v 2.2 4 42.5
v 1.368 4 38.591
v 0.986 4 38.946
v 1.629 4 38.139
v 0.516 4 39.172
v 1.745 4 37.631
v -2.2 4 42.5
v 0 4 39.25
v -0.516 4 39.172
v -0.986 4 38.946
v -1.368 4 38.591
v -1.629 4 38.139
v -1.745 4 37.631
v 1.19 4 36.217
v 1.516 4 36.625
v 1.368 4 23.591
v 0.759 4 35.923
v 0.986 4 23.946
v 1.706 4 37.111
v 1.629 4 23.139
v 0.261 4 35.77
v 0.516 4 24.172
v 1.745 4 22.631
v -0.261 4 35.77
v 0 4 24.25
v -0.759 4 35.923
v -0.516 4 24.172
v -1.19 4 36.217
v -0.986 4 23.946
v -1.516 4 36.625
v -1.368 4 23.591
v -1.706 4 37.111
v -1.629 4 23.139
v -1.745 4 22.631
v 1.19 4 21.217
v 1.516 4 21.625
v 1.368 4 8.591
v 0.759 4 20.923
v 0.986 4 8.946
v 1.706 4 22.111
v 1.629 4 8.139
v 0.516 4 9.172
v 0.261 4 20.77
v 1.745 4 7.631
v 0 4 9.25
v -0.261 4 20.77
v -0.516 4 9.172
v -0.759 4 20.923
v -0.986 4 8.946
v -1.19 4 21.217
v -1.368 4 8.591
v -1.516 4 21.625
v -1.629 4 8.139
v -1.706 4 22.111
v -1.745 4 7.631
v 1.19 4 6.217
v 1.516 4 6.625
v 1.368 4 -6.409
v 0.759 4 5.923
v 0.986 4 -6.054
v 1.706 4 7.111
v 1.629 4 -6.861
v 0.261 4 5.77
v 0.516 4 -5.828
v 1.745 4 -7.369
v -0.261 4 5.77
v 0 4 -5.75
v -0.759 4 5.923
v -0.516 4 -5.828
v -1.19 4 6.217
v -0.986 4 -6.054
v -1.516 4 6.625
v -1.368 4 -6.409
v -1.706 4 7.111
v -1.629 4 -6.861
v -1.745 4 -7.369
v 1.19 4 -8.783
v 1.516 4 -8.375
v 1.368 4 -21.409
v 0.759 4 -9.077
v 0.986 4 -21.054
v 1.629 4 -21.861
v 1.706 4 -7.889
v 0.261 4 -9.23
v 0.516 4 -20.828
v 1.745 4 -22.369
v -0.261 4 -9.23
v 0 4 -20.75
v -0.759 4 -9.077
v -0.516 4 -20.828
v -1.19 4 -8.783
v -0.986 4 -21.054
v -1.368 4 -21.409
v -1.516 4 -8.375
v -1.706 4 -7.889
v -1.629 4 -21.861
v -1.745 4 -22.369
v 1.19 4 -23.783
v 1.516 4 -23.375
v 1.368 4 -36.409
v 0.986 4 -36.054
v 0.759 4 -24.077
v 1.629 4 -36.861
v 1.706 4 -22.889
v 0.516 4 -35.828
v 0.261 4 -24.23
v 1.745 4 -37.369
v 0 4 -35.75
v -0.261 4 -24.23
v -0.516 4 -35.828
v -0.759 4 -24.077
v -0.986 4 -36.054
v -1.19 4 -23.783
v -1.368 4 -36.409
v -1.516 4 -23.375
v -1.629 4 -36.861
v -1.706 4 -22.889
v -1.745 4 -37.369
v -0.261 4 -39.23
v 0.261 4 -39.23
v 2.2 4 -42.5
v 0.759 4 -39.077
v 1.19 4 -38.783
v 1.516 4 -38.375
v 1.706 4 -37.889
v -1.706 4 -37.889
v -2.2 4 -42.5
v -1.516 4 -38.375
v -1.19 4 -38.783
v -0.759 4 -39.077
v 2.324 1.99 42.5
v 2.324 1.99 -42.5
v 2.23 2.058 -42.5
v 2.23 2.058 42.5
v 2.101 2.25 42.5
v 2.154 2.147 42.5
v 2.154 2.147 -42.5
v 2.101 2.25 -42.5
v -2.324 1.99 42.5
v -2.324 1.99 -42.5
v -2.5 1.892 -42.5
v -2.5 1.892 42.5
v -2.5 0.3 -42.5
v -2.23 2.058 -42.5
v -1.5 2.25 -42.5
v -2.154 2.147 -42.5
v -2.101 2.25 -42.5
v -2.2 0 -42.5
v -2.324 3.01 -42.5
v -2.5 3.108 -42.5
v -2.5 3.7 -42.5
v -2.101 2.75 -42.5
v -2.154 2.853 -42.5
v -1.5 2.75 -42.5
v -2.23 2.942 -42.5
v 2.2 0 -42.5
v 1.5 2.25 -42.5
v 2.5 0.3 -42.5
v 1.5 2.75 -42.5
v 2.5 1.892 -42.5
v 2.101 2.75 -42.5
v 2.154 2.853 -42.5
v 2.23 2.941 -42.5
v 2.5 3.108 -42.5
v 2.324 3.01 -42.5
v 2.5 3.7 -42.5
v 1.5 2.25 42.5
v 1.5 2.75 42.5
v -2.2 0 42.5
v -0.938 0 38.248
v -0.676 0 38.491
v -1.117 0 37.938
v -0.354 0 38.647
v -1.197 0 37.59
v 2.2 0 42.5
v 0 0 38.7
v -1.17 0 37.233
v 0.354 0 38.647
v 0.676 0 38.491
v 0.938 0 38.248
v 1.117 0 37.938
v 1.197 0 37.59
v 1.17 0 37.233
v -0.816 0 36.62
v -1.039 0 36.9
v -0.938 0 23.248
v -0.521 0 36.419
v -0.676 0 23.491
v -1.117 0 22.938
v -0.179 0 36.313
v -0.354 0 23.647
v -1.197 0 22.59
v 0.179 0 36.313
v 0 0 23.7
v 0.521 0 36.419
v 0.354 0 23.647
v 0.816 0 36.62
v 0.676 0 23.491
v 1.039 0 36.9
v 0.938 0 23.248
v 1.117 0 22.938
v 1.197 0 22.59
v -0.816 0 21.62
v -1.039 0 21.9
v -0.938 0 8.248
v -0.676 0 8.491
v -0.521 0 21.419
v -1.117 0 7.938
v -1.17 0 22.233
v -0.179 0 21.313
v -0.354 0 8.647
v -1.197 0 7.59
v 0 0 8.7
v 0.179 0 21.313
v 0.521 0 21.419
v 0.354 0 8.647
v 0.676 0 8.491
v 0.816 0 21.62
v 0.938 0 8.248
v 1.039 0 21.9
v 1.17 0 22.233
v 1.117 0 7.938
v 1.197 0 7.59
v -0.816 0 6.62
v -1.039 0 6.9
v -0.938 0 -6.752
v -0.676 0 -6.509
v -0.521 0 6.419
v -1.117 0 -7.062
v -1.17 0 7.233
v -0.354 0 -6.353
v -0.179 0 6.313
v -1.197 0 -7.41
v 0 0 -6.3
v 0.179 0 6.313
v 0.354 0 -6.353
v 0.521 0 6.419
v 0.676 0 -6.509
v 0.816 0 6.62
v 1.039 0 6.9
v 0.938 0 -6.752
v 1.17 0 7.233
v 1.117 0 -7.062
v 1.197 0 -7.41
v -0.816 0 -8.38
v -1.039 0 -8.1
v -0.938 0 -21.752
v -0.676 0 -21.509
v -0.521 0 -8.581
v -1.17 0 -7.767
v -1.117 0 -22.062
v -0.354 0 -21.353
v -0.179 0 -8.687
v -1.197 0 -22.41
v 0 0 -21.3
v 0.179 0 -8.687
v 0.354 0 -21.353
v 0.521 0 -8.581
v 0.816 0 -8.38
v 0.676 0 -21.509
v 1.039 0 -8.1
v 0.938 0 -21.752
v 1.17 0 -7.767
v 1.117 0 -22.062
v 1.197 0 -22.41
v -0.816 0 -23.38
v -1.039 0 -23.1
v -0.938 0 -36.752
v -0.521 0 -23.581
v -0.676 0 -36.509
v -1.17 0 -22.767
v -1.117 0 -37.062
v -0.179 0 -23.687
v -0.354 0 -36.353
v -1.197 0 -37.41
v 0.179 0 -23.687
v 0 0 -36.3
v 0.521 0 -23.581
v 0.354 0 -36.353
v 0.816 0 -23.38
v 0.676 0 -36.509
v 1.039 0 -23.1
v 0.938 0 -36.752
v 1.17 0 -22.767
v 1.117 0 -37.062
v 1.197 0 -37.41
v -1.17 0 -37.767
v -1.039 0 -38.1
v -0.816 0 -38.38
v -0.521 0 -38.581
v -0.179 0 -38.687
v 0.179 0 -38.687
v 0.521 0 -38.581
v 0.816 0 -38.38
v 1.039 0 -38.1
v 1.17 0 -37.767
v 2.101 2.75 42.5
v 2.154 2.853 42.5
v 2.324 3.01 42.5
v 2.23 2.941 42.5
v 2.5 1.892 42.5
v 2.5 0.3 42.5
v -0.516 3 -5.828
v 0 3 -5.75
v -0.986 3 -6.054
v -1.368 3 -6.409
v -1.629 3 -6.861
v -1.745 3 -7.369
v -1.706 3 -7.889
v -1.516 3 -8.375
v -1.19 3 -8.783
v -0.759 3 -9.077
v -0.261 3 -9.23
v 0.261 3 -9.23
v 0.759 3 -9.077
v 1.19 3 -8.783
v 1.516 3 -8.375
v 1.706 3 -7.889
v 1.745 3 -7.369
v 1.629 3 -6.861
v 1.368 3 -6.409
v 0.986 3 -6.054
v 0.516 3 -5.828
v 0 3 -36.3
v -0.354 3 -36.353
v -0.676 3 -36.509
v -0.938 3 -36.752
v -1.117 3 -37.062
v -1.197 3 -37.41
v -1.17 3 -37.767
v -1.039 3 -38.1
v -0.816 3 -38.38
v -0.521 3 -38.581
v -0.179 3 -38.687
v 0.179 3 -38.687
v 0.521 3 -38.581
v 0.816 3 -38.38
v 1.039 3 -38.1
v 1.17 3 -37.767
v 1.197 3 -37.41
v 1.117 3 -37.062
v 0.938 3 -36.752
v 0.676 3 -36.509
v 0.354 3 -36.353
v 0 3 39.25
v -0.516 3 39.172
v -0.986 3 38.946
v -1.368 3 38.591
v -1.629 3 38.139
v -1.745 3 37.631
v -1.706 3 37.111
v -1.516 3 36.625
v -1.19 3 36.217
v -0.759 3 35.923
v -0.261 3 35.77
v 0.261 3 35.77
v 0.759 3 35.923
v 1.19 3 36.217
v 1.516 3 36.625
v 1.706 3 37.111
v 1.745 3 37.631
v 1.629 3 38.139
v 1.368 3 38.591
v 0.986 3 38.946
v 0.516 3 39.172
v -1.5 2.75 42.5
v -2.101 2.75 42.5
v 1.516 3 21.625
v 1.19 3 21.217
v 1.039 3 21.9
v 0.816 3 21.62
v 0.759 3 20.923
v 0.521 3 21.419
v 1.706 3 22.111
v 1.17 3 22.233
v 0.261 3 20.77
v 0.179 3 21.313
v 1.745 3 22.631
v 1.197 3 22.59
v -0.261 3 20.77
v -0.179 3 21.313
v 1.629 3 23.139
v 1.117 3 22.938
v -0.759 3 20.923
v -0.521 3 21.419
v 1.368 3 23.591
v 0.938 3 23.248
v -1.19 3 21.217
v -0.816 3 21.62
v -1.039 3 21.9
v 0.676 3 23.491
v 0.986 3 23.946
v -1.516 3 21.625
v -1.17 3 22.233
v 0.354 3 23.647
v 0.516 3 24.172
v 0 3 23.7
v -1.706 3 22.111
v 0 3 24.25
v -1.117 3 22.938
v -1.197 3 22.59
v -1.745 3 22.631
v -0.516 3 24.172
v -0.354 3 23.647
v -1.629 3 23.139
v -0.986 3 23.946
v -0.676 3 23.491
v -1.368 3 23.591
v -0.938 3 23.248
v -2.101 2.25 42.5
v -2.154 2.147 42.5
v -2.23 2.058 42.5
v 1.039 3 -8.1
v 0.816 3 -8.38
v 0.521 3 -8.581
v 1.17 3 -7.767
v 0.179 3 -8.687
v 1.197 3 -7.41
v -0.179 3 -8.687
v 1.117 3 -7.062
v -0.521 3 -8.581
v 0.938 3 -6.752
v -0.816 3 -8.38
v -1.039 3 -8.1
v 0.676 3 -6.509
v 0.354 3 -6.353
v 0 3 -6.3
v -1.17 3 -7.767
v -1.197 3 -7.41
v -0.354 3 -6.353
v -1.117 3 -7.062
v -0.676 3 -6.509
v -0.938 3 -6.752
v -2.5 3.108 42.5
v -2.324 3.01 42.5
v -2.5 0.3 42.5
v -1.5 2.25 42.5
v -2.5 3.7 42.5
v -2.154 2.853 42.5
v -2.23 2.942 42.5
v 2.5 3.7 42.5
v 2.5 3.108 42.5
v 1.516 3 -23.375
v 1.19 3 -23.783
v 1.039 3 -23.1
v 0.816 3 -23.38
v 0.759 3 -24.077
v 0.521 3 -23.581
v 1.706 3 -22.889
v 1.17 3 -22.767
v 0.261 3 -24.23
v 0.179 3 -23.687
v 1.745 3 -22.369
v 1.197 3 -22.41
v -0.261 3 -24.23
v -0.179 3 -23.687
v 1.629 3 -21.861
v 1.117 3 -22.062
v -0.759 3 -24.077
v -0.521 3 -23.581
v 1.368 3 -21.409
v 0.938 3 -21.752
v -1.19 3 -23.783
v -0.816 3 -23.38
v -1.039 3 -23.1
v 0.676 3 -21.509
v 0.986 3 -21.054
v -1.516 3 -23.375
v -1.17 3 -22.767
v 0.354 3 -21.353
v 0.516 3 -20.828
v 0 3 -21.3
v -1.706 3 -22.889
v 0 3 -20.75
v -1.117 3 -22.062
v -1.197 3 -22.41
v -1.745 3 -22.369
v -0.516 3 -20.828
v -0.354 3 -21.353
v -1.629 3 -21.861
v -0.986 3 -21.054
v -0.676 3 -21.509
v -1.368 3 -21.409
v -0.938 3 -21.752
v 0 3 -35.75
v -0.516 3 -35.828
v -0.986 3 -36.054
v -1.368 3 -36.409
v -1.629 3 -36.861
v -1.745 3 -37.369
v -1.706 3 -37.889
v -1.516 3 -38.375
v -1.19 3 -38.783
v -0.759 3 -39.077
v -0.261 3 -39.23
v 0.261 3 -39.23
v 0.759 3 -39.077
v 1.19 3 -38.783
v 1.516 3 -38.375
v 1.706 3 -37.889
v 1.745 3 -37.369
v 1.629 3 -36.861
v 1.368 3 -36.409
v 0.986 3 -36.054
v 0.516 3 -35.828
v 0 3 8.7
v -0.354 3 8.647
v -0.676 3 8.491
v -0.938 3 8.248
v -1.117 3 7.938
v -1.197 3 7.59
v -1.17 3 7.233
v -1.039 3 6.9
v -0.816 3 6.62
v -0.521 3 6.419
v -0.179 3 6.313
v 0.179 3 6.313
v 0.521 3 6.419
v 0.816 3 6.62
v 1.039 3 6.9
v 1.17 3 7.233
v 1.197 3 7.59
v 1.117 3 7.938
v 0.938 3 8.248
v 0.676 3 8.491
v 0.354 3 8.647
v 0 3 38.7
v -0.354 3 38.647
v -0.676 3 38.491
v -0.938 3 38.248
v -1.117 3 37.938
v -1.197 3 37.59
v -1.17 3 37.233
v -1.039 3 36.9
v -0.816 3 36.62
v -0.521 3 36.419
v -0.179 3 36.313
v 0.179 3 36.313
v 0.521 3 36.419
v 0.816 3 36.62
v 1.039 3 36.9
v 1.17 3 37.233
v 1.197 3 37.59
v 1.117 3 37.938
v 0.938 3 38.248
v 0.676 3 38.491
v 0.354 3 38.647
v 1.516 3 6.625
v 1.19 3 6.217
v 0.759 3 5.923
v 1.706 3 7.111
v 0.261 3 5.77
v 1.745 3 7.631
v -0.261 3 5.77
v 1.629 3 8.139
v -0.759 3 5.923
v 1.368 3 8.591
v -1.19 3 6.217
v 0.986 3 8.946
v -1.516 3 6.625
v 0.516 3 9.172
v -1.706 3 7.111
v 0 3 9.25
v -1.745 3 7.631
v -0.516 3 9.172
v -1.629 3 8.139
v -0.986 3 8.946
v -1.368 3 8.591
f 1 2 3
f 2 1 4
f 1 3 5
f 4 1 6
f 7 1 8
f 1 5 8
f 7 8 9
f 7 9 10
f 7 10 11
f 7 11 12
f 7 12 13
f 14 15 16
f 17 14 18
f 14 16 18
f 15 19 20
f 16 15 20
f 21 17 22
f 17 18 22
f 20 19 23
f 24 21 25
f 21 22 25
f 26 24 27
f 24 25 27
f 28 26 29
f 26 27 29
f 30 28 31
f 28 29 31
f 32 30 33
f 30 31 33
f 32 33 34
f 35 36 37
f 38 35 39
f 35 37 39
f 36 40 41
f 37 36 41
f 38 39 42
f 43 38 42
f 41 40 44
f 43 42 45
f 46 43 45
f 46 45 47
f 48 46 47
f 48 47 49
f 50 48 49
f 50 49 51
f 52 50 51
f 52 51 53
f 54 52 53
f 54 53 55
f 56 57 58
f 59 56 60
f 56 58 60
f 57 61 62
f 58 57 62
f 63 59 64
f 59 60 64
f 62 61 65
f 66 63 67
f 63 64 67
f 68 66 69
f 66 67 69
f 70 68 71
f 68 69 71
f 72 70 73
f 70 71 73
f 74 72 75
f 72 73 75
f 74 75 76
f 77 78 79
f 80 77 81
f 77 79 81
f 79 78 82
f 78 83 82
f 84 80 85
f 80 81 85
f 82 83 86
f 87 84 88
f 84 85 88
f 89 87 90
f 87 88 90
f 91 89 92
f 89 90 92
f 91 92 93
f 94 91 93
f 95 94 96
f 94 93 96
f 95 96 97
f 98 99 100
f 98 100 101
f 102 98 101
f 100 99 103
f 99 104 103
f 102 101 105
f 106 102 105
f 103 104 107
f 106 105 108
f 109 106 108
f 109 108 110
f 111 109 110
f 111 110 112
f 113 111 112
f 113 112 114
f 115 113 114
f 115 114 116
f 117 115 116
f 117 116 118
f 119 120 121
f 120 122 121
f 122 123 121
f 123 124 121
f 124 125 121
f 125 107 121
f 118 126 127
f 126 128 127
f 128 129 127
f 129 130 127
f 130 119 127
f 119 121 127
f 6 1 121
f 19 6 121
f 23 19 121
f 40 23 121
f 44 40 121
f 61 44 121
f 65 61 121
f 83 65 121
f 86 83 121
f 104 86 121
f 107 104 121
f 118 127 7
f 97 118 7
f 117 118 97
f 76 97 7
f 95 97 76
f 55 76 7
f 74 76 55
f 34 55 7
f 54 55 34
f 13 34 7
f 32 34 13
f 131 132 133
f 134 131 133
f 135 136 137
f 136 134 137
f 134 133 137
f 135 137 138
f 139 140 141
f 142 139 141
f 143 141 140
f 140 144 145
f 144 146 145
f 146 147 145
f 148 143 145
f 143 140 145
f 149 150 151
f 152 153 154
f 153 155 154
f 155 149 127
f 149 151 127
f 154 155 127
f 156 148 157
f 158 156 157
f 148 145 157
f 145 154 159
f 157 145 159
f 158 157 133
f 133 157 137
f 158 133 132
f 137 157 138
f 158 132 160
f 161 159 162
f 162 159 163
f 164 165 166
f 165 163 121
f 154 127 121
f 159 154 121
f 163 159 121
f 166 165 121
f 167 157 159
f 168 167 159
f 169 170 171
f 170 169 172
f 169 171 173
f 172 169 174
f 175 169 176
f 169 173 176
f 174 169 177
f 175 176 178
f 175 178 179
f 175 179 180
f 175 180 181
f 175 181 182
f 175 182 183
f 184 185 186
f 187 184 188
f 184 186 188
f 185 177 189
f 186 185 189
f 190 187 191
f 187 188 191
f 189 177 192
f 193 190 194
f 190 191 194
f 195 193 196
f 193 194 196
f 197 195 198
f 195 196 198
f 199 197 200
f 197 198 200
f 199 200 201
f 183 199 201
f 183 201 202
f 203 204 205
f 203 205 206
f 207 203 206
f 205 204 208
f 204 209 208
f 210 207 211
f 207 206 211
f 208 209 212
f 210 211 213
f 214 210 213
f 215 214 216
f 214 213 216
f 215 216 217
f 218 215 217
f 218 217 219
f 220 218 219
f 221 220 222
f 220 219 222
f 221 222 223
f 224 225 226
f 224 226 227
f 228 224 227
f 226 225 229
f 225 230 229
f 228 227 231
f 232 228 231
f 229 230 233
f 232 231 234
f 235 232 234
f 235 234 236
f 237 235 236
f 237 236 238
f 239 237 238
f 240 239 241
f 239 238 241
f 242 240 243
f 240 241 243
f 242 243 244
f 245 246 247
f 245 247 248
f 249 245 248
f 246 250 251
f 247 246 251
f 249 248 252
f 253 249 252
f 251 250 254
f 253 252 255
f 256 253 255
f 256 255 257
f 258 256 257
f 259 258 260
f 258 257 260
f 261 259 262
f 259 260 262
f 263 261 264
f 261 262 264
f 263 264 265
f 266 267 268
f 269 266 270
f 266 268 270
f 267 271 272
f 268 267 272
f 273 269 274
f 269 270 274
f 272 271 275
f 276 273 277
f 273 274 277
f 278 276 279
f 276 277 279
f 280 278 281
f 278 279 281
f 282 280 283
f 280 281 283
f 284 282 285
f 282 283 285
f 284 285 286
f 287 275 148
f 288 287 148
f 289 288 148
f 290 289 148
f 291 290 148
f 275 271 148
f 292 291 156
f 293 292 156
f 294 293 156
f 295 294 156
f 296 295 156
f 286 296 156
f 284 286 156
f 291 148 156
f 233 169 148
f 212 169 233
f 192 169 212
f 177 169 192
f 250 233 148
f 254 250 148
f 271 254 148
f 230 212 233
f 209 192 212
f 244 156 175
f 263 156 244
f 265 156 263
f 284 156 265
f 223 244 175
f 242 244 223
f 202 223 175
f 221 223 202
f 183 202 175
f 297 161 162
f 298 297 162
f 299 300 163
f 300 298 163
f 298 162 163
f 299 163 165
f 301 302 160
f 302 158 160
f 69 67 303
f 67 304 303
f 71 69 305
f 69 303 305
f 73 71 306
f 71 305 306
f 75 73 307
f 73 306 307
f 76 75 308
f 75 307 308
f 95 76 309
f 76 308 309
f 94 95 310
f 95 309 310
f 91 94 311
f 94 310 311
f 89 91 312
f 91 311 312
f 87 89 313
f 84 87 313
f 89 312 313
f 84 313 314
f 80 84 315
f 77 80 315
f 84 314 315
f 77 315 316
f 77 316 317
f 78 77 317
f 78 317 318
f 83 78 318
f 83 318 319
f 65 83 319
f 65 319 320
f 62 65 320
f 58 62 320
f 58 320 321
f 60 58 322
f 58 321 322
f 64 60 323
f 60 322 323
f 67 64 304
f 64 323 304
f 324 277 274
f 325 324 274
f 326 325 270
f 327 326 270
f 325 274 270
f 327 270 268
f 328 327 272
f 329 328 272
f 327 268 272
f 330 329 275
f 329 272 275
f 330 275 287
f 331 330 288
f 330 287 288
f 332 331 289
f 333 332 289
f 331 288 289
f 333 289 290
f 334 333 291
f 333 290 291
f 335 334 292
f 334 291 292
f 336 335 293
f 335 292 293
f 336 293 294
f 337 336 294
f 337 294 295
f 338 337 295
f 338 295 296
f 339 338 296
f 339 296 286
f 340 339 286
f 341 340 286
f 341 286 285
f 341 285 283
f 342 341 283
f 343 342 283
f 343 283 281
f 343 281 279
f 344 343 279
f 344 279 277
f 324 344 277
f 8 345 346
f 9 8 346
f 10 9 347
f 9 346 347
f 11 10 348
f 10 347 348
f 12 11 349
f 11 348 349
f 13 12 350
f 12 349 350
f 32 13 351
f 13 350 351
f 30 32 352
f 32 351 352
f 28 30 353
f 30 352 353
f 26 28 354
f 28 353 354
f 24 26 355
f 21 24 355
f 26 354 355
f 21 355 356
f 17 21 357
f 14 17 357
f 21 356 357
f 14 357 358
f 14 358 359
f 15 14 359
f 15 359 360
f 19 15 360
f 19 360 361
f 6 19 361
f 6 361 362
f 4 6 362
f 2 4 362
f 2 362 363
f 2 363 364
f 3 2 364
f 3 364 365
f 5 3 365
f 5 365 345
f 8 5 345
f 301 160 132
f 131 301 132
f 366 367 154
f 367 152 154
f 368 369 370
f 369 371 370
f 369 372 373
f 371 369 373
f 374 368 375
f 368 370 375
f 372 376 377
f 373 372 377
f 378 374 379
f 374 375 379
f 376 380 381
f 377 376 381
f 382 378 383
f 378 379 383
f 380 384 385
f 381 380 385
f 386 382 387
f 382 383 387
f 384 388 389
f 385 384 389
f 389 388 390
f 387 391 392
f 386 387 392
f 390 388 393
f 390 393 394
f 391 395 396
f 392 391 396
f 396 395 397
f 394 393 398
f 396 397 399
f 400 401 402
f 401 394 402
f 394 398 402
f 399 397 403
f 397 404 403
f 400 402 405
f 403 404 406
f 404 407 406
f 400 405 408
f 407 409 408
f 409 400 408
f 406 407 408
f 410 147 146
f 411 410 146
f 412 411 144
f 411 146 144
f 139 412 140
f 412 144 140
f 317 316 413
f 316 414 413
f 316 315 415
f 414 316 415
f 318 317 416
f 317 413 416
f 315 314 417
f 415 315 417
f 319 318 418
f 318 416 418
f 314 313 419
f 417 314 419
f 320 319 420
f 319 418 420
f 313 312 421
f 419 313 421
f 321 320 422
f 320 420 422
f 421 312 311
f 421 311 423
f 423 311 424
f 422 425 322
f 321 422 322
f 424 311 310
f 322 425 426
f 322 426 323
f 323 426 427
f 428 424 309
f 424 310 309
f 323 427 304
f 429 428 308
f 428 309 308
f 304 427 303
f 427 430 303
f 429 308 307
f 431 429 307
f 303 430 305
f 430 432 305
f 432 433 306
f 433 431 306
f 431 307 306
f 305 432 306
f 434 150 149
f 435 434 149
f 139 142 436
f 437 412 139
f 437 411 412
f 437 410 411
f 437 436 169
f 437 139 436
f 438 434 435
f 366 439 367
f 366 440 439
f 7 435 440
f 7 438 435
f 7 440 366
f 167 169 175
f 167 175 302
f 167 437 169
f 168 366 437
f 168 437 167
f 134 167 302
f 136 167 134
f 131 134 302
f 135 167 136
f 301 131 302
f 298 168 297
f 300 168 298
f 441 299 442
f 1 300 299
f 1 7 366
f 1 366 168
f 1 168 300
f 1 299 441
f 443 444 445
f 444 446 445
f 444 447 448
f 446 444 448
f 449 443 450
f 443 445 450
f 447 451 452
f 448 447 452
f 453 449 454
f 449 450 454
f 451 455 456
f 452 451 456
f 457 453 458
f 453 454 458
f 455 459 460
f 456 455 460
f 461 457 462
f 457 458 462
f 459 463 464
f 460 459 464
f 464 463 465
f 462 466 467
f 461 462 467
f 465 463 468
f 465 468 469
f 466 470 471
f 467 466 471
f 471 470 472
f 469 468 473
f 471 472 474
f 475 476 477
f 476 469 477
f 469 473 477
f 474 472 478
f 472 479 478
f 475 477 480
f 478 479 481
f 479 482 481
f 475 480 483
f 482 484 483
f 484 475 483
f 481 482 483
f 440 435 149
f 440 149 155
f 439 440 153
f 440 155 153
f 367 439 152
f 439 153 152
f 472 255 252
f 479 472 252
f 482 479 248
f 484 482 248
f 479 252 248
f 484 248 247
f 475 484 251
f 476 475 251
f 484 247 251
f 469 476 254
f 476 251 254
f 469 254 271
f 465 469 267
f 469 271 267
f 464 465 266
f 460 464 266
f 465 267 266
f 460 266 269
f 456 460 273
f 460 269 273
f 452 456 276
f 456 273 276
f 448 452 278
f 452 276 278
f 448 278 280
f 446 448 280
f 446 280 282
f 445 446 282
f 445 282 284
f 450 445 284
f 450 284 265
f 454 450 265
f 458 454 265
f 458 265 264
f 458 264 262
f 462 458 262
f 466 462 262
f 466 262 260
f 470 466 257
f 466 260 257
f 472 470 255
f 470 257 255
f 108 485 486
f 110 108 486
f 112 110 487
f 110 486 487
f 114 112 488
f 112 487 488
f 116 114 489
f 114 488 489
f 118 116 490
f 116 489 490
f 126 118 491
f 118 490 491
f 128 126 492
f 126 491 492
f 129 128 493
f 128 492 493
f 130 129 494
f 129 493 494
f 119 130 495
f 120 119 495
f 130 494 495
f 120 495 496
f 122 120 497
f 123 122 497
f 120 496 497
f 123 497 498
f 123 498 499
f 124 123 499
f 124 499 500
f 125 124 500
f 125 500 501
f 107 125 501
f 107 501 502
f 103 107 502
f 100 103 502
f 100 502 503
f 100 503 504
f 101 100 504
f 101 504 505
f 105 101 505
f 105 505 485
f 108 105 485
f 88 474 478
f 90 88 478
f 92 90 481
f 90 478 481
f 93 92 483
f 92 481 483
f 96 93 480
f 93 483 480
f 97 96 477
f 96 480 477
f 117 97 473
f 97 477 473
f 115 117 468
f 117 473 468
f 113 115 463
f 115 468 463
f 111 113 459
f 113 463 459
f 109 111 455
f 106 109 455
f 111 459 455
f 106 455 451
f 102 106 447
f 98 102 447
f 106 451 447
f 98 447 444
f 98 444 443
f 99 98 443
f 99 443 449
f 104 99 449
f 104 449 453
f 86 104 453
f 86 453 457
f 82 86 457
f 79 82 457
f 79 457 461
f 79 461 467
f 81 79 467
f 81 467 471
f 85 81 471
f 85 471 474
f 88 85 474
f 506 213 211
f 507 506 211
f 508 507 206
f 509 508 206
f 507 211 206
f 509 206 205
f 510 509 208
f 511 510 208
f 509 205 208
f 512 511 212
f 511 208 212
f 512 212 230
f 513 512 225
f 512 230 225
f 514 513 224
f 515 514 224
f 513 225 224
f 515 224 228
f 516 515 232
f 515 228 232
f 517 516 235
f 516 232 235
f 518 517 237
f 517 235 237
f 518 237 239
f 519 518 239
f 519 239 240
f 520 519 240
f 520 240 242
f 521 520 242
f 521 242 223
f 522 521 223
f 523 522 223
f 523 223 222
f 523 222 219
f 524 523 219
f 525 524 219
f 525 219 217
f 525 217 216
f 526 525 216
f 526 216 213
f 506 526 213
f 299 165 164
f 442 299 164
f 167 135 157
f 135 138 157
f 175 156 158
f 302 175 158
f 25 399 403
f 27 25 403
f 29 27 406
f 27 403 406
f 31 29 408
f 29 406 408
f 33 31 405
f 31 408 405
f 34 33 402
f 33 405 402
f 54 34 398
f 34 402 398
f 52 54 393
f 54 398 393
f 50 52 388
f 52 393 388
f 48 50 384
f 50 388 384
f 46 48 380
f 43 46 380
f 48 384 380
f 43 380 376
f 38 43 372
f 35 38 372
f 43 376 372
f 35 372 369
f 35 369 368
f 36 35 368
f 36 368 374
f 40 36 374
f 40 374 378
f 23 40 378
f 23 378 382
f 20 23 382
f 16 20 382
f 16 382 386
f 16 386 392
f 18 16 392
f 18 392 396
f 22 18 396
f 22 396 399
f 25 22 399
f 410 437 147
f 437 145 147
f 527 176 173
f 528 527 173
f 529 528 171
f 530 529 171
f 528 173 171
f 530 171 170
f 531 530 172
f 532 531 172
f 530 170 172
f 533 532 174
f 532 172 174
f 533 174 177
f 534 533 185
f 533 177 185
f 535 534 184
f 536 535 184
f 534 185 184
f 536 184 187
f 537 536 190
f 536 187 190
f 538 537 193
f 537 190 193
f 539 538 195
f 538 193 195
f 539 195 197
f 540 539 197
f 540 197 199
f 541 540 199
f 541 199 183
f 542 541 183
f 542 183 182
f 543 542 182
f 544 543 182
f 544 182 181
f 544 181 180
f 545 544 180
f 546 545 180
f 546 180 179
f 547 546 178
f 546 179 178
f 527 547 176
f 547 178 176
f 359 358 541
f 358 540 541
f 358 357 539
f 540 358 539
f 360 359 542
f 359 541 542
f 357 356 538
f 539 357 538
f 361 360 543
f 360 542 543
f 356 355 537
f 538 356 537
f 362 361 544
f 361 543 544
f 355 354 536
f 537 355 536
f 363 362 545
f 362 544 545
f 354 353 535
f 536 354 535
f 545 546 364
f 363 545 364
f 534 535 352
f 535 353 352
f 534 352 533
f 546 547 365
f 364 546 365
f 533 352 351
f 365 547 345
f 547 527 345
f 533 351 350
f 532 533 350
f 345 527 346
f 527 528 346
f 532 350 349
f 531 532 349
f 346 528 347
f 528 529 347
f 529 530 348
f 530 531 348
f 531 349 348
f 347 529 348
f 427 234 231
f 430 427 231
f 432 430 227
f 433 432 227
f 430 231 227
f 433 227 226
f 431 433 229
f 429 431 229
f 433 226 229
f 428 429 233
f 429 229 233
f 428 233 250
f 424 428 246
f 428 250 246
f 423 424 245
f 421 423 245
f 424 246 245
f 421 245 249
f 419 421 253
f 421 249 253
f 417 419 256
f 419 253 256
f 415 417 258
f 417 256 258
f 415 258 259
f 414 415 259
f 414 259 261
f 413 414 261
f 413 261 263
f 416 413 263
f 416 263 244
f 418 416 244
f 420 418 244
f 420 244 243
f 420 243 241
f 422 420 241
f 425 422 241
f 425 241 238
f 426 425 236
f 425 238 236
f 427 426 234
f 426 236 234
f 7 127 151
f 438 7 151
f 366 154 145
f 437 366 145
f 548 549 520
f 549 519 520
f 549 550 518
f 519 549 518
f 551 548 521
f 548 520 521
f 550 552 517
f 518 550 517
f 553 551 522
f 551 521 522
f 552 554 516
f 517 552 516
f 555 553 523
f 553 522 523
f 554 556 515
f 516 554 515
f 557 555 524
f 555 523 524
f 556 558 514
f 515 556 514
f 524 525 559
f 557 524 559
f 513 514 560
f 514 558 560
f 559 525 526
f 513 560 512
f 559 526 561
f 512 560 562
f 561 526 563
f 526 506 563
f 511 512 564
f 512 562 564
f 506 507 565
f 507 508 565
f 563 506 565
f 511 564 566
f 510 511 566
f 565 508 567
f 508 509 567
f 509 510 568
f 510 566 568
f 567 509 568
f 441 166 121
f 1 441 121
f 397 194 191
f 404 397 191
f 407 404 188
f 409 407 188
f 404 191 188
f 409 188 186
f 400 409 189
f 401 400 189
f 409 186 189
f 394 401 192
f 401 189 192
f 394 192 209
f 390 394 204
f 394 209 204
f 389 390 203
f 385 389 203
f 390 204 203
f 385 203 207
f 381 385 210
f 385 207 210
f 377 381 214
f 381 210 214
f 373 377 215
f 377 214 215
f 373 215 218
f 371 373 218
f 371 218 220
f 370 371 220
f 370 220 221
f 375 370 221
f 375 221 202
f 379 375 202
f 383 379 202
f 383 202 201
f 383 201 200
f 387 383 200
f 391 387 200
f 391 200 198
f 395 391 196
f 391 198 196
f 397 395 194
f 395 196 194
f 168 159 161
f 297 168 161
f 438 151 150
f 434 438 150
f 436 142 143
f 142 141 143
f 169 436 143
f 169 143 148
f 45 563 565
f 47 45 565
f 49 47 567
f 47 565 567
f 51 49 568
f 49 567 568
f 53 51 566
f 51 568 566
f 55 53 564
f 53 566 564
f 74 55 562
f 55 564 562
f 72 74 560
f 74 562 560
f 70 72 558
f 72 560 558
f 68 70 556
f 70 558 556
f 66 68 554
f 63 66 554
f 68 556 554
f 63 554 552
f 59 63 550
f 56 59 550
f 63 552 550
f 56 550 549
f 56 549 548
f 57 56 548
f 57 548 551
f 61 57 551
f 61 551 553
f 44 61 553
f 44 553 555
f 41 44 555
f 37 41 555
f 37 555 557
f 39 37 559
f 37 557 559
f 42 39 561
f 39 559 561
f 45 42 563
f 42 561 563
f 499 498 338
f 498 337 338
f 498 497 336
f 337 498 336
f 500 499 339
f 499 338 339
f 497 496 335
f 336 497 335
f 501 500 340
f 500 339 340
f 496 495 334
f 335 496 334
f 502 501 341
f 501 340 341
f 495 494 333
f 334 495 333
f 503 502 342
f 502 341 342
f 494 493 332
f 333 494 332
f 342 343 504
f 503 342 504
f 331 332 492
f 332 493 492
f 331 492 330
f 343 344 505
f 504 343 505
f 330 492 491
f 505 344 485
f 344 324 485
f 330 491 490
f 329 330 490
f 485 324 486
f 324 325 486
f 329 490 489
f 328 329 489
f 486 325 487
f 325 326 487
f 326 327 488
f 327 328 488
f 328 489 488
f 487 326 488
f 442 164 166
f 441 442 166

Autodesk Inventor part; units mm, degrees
sketch "Sketch_12" plane through (0, 0, 0) normal (0, 0, 1) x (1, 0, 0)
  line L0 (-2.5, 3.7) -> (-2.5, 3.1084)
  line L1 (-2.5, 3.1084) -> (-2.3242, 3.0098)
  arc A0 (-2.1007, 2.75) -> (-2.3242, 3.0098) centre (-2.5686, 2.5736) ccw
  line L2 (-2.1007, 2.75) -> (-1.5, 2.75)
  line L3 (-1.5, 2.75) -> (-1.5, 2.25)
  line L4 (-1.5, 2.25) -> (-2.1007, 2.25)
  arc A1 (-2.3242, 1.9902) -> (-2.1007, 2.25) centre (-2.5686, 2.4264) ccw
  line L5 (-2.3242, 1.9902) -> (-2.5, 1.8917)
  line L6 (-2.5, 1.8917) -> (-2.5, 0.3)
  line L7 (-2.5, 0.3) -> (-2.2, 0)
  line L8 (-2.2, 0) -> (2.2, 0)
  line L9 (2.2, 0) -> (2.5, 0.3)
  line L10 (2.5, 0.3) -> (2.5, 1.8917)
  line L11 (2.5, 1.8917) -> (2.3242, 1.9902)
  arc A2 (2.1007, 2.25) -> (2.3242, 1.9902) centre (2.5686, 2.4263) ccw
  line L12 (2.1007, 2.25) -> (1.5, 2.25)
  line L13 (1.5, 2.25) -> (1.5, 2.75)
  line L14 (1.5, 2.75) -> (2.1007, 2.75)
  arc A3 (2.3242, 3.0098) -> (2.1007, 2.75) centre (2.5686, 2.5737) ccw
  line L15 (2.3242, 3.0098) -> (2.5, 3.1084)
  line L16 (2.5, 3.1084) -> (2.5, 3.7)
  line L17 (2.5, 3.7) -> (2.2, 4)
  line L18 (2.2, 4) -> (-2.2, 4)
  line L19 (-2.2, 4) -> (-2.5, 3.7)
extrude "Extrusion1" add sketch "Sketch_12" along normal mid plane 85
sketch "Sketch2" plane through (-2.2, 4, 42.5) normal (0, 1, 0) x (1, 0, 0)
  point P0 (2.2, 80)
hole "Hole1" at (0, 4, -37.5) direction (0, -1, 0) diameter 2.4 depth 4 counterbore diameter 3.5 counterbore depth 1
pattern_linear "Rectangular Pattern1" count 6 spacing 15 along (0, 0, 1) of "Hole1"
ref_plane "rail_to_adjusting_block_XY" through (0, 0, -37.5) normal (0, 1, 0) x (1, 0, 0)
ref_plane "rail_to_adjusting_block_YZ" through (0, 0, -37.5) normal (1, 0, 0) x (0, 0, -1)
ref_plane "rail_to_adjusting_block_ZX" through (0, 0, -37.5) normal (0, 0, -1) x (0, 1, 0)
ref_plane "screw_1_XY" through (0, 3, 37.5) normal (0, -1, 0) x (1, 0, 0)
ref_plane "screw_1_YZ" through (0, 3, 37.5) normal (1, 0, 0) x (0, 0, 1)
ref_plane "screw_1_ZX" through (0, 3, 37.5) normal (0, 0, 1) x (0, -1, 0)
ref_plane "screw_2_XY" through (0, 3, 22.5) normal (0, -1, 0) x (1, 0, 0)
ref_plane "screw_2_YZ" through (0, 3, 22.5) normal (1, 0, 0) x (0, 0, 1)
ref_plane "screw_2_ZX" through (0, 3, 22.5) normal (0, 0, 1) x (0, -1, 0)
ref_plane "screw_3_XY" through (0, 3, 7.5) normal (0, -1, 0) x (1, 0, 0)
ref_plane "screw_3_YZ" through (0, 3, 7.5) normal (1, 0, 0) x (0, 0, 1)
ref_plane "screw_3_ZX" through (0, 3, 7.5) normal (0, 0, 1) x (0, -1, 0)
ref_plane "screw_4_XY" through (0, 3, -7.5) normal (0, -1, 0) x (1, 0, 0)
ref_plane "screw_4_YZ" through (0, 3, -7.5) normal (1, 0, 0) x (0, 0, 1)
ref_plane "screw_4_ZX" through (0, 3, -7.5) normal (0, 0, 1) x (0, -1, 0)
ref_plane "screw_5_XY" through (0, 3, -22.5) normal (0, -1, 0) x (1, 0, 0)
ref_plane "screw_5_YZ" through (0, 3, -22.5) normal (1, 0, 0) x (0, 0, 1)
ref_plane "screw_5_ZX" through (0, 3, -22.5) normal (0, 0, 1) x (0, -1, 0)
ref_plane "screw_6_XY" through (0, 3, -37.5) normal (0, -1, 0) x (1, 0, 0)
ref_plane "screw_6_YZ" through (0, 3, -37.5) normal (1, 0, 0) x (0, 0, 1)
ref_plane "screw_6_ZX" through (0, 3, -37.5) normal (0, 0, 1) x (0, -1, 0)
ref_plane "to_block_XY" through (0, 4, 21.25) normal (0, 0, 1) x (1, 0, 0)
ref_plane "to_block_YZ" through (0, 4, 21.25) normal (1, 0, 0) x (0, 1, 0)
ref_plane "to_block_ZX" through (0, 4, 21.25) normal (0, 1, 0) x (0, 0, 1)
ref_plane "to_block_2_XY" through (0, 4, -21.25) normal (0, 0, 1) x (1, 0, 0)
ref_plane "to_block_2_YZ" through (0, 4, -21.25) normal (1, 0, 0) x (0, 1, 0)
ref_plane "to_block_2_ZX" through (0, 4, -21.25) normal (0, 1, 0) x (0, 0, 1)
ref_plane "to_kue_XY" through (0, 0, 0) normal (0, 1, 0) x (1, 0, 0)
ref_plane "to_kue_YZ" through (0, 0, 0) normal (1, 0, 0) x (0, 0, -1)
ref_plane "to_kue_ZX" through (0, 0, 0) normal (0, 0, -1) x (0, 1, 0)
properties part number "SSE2B6-85_r"
